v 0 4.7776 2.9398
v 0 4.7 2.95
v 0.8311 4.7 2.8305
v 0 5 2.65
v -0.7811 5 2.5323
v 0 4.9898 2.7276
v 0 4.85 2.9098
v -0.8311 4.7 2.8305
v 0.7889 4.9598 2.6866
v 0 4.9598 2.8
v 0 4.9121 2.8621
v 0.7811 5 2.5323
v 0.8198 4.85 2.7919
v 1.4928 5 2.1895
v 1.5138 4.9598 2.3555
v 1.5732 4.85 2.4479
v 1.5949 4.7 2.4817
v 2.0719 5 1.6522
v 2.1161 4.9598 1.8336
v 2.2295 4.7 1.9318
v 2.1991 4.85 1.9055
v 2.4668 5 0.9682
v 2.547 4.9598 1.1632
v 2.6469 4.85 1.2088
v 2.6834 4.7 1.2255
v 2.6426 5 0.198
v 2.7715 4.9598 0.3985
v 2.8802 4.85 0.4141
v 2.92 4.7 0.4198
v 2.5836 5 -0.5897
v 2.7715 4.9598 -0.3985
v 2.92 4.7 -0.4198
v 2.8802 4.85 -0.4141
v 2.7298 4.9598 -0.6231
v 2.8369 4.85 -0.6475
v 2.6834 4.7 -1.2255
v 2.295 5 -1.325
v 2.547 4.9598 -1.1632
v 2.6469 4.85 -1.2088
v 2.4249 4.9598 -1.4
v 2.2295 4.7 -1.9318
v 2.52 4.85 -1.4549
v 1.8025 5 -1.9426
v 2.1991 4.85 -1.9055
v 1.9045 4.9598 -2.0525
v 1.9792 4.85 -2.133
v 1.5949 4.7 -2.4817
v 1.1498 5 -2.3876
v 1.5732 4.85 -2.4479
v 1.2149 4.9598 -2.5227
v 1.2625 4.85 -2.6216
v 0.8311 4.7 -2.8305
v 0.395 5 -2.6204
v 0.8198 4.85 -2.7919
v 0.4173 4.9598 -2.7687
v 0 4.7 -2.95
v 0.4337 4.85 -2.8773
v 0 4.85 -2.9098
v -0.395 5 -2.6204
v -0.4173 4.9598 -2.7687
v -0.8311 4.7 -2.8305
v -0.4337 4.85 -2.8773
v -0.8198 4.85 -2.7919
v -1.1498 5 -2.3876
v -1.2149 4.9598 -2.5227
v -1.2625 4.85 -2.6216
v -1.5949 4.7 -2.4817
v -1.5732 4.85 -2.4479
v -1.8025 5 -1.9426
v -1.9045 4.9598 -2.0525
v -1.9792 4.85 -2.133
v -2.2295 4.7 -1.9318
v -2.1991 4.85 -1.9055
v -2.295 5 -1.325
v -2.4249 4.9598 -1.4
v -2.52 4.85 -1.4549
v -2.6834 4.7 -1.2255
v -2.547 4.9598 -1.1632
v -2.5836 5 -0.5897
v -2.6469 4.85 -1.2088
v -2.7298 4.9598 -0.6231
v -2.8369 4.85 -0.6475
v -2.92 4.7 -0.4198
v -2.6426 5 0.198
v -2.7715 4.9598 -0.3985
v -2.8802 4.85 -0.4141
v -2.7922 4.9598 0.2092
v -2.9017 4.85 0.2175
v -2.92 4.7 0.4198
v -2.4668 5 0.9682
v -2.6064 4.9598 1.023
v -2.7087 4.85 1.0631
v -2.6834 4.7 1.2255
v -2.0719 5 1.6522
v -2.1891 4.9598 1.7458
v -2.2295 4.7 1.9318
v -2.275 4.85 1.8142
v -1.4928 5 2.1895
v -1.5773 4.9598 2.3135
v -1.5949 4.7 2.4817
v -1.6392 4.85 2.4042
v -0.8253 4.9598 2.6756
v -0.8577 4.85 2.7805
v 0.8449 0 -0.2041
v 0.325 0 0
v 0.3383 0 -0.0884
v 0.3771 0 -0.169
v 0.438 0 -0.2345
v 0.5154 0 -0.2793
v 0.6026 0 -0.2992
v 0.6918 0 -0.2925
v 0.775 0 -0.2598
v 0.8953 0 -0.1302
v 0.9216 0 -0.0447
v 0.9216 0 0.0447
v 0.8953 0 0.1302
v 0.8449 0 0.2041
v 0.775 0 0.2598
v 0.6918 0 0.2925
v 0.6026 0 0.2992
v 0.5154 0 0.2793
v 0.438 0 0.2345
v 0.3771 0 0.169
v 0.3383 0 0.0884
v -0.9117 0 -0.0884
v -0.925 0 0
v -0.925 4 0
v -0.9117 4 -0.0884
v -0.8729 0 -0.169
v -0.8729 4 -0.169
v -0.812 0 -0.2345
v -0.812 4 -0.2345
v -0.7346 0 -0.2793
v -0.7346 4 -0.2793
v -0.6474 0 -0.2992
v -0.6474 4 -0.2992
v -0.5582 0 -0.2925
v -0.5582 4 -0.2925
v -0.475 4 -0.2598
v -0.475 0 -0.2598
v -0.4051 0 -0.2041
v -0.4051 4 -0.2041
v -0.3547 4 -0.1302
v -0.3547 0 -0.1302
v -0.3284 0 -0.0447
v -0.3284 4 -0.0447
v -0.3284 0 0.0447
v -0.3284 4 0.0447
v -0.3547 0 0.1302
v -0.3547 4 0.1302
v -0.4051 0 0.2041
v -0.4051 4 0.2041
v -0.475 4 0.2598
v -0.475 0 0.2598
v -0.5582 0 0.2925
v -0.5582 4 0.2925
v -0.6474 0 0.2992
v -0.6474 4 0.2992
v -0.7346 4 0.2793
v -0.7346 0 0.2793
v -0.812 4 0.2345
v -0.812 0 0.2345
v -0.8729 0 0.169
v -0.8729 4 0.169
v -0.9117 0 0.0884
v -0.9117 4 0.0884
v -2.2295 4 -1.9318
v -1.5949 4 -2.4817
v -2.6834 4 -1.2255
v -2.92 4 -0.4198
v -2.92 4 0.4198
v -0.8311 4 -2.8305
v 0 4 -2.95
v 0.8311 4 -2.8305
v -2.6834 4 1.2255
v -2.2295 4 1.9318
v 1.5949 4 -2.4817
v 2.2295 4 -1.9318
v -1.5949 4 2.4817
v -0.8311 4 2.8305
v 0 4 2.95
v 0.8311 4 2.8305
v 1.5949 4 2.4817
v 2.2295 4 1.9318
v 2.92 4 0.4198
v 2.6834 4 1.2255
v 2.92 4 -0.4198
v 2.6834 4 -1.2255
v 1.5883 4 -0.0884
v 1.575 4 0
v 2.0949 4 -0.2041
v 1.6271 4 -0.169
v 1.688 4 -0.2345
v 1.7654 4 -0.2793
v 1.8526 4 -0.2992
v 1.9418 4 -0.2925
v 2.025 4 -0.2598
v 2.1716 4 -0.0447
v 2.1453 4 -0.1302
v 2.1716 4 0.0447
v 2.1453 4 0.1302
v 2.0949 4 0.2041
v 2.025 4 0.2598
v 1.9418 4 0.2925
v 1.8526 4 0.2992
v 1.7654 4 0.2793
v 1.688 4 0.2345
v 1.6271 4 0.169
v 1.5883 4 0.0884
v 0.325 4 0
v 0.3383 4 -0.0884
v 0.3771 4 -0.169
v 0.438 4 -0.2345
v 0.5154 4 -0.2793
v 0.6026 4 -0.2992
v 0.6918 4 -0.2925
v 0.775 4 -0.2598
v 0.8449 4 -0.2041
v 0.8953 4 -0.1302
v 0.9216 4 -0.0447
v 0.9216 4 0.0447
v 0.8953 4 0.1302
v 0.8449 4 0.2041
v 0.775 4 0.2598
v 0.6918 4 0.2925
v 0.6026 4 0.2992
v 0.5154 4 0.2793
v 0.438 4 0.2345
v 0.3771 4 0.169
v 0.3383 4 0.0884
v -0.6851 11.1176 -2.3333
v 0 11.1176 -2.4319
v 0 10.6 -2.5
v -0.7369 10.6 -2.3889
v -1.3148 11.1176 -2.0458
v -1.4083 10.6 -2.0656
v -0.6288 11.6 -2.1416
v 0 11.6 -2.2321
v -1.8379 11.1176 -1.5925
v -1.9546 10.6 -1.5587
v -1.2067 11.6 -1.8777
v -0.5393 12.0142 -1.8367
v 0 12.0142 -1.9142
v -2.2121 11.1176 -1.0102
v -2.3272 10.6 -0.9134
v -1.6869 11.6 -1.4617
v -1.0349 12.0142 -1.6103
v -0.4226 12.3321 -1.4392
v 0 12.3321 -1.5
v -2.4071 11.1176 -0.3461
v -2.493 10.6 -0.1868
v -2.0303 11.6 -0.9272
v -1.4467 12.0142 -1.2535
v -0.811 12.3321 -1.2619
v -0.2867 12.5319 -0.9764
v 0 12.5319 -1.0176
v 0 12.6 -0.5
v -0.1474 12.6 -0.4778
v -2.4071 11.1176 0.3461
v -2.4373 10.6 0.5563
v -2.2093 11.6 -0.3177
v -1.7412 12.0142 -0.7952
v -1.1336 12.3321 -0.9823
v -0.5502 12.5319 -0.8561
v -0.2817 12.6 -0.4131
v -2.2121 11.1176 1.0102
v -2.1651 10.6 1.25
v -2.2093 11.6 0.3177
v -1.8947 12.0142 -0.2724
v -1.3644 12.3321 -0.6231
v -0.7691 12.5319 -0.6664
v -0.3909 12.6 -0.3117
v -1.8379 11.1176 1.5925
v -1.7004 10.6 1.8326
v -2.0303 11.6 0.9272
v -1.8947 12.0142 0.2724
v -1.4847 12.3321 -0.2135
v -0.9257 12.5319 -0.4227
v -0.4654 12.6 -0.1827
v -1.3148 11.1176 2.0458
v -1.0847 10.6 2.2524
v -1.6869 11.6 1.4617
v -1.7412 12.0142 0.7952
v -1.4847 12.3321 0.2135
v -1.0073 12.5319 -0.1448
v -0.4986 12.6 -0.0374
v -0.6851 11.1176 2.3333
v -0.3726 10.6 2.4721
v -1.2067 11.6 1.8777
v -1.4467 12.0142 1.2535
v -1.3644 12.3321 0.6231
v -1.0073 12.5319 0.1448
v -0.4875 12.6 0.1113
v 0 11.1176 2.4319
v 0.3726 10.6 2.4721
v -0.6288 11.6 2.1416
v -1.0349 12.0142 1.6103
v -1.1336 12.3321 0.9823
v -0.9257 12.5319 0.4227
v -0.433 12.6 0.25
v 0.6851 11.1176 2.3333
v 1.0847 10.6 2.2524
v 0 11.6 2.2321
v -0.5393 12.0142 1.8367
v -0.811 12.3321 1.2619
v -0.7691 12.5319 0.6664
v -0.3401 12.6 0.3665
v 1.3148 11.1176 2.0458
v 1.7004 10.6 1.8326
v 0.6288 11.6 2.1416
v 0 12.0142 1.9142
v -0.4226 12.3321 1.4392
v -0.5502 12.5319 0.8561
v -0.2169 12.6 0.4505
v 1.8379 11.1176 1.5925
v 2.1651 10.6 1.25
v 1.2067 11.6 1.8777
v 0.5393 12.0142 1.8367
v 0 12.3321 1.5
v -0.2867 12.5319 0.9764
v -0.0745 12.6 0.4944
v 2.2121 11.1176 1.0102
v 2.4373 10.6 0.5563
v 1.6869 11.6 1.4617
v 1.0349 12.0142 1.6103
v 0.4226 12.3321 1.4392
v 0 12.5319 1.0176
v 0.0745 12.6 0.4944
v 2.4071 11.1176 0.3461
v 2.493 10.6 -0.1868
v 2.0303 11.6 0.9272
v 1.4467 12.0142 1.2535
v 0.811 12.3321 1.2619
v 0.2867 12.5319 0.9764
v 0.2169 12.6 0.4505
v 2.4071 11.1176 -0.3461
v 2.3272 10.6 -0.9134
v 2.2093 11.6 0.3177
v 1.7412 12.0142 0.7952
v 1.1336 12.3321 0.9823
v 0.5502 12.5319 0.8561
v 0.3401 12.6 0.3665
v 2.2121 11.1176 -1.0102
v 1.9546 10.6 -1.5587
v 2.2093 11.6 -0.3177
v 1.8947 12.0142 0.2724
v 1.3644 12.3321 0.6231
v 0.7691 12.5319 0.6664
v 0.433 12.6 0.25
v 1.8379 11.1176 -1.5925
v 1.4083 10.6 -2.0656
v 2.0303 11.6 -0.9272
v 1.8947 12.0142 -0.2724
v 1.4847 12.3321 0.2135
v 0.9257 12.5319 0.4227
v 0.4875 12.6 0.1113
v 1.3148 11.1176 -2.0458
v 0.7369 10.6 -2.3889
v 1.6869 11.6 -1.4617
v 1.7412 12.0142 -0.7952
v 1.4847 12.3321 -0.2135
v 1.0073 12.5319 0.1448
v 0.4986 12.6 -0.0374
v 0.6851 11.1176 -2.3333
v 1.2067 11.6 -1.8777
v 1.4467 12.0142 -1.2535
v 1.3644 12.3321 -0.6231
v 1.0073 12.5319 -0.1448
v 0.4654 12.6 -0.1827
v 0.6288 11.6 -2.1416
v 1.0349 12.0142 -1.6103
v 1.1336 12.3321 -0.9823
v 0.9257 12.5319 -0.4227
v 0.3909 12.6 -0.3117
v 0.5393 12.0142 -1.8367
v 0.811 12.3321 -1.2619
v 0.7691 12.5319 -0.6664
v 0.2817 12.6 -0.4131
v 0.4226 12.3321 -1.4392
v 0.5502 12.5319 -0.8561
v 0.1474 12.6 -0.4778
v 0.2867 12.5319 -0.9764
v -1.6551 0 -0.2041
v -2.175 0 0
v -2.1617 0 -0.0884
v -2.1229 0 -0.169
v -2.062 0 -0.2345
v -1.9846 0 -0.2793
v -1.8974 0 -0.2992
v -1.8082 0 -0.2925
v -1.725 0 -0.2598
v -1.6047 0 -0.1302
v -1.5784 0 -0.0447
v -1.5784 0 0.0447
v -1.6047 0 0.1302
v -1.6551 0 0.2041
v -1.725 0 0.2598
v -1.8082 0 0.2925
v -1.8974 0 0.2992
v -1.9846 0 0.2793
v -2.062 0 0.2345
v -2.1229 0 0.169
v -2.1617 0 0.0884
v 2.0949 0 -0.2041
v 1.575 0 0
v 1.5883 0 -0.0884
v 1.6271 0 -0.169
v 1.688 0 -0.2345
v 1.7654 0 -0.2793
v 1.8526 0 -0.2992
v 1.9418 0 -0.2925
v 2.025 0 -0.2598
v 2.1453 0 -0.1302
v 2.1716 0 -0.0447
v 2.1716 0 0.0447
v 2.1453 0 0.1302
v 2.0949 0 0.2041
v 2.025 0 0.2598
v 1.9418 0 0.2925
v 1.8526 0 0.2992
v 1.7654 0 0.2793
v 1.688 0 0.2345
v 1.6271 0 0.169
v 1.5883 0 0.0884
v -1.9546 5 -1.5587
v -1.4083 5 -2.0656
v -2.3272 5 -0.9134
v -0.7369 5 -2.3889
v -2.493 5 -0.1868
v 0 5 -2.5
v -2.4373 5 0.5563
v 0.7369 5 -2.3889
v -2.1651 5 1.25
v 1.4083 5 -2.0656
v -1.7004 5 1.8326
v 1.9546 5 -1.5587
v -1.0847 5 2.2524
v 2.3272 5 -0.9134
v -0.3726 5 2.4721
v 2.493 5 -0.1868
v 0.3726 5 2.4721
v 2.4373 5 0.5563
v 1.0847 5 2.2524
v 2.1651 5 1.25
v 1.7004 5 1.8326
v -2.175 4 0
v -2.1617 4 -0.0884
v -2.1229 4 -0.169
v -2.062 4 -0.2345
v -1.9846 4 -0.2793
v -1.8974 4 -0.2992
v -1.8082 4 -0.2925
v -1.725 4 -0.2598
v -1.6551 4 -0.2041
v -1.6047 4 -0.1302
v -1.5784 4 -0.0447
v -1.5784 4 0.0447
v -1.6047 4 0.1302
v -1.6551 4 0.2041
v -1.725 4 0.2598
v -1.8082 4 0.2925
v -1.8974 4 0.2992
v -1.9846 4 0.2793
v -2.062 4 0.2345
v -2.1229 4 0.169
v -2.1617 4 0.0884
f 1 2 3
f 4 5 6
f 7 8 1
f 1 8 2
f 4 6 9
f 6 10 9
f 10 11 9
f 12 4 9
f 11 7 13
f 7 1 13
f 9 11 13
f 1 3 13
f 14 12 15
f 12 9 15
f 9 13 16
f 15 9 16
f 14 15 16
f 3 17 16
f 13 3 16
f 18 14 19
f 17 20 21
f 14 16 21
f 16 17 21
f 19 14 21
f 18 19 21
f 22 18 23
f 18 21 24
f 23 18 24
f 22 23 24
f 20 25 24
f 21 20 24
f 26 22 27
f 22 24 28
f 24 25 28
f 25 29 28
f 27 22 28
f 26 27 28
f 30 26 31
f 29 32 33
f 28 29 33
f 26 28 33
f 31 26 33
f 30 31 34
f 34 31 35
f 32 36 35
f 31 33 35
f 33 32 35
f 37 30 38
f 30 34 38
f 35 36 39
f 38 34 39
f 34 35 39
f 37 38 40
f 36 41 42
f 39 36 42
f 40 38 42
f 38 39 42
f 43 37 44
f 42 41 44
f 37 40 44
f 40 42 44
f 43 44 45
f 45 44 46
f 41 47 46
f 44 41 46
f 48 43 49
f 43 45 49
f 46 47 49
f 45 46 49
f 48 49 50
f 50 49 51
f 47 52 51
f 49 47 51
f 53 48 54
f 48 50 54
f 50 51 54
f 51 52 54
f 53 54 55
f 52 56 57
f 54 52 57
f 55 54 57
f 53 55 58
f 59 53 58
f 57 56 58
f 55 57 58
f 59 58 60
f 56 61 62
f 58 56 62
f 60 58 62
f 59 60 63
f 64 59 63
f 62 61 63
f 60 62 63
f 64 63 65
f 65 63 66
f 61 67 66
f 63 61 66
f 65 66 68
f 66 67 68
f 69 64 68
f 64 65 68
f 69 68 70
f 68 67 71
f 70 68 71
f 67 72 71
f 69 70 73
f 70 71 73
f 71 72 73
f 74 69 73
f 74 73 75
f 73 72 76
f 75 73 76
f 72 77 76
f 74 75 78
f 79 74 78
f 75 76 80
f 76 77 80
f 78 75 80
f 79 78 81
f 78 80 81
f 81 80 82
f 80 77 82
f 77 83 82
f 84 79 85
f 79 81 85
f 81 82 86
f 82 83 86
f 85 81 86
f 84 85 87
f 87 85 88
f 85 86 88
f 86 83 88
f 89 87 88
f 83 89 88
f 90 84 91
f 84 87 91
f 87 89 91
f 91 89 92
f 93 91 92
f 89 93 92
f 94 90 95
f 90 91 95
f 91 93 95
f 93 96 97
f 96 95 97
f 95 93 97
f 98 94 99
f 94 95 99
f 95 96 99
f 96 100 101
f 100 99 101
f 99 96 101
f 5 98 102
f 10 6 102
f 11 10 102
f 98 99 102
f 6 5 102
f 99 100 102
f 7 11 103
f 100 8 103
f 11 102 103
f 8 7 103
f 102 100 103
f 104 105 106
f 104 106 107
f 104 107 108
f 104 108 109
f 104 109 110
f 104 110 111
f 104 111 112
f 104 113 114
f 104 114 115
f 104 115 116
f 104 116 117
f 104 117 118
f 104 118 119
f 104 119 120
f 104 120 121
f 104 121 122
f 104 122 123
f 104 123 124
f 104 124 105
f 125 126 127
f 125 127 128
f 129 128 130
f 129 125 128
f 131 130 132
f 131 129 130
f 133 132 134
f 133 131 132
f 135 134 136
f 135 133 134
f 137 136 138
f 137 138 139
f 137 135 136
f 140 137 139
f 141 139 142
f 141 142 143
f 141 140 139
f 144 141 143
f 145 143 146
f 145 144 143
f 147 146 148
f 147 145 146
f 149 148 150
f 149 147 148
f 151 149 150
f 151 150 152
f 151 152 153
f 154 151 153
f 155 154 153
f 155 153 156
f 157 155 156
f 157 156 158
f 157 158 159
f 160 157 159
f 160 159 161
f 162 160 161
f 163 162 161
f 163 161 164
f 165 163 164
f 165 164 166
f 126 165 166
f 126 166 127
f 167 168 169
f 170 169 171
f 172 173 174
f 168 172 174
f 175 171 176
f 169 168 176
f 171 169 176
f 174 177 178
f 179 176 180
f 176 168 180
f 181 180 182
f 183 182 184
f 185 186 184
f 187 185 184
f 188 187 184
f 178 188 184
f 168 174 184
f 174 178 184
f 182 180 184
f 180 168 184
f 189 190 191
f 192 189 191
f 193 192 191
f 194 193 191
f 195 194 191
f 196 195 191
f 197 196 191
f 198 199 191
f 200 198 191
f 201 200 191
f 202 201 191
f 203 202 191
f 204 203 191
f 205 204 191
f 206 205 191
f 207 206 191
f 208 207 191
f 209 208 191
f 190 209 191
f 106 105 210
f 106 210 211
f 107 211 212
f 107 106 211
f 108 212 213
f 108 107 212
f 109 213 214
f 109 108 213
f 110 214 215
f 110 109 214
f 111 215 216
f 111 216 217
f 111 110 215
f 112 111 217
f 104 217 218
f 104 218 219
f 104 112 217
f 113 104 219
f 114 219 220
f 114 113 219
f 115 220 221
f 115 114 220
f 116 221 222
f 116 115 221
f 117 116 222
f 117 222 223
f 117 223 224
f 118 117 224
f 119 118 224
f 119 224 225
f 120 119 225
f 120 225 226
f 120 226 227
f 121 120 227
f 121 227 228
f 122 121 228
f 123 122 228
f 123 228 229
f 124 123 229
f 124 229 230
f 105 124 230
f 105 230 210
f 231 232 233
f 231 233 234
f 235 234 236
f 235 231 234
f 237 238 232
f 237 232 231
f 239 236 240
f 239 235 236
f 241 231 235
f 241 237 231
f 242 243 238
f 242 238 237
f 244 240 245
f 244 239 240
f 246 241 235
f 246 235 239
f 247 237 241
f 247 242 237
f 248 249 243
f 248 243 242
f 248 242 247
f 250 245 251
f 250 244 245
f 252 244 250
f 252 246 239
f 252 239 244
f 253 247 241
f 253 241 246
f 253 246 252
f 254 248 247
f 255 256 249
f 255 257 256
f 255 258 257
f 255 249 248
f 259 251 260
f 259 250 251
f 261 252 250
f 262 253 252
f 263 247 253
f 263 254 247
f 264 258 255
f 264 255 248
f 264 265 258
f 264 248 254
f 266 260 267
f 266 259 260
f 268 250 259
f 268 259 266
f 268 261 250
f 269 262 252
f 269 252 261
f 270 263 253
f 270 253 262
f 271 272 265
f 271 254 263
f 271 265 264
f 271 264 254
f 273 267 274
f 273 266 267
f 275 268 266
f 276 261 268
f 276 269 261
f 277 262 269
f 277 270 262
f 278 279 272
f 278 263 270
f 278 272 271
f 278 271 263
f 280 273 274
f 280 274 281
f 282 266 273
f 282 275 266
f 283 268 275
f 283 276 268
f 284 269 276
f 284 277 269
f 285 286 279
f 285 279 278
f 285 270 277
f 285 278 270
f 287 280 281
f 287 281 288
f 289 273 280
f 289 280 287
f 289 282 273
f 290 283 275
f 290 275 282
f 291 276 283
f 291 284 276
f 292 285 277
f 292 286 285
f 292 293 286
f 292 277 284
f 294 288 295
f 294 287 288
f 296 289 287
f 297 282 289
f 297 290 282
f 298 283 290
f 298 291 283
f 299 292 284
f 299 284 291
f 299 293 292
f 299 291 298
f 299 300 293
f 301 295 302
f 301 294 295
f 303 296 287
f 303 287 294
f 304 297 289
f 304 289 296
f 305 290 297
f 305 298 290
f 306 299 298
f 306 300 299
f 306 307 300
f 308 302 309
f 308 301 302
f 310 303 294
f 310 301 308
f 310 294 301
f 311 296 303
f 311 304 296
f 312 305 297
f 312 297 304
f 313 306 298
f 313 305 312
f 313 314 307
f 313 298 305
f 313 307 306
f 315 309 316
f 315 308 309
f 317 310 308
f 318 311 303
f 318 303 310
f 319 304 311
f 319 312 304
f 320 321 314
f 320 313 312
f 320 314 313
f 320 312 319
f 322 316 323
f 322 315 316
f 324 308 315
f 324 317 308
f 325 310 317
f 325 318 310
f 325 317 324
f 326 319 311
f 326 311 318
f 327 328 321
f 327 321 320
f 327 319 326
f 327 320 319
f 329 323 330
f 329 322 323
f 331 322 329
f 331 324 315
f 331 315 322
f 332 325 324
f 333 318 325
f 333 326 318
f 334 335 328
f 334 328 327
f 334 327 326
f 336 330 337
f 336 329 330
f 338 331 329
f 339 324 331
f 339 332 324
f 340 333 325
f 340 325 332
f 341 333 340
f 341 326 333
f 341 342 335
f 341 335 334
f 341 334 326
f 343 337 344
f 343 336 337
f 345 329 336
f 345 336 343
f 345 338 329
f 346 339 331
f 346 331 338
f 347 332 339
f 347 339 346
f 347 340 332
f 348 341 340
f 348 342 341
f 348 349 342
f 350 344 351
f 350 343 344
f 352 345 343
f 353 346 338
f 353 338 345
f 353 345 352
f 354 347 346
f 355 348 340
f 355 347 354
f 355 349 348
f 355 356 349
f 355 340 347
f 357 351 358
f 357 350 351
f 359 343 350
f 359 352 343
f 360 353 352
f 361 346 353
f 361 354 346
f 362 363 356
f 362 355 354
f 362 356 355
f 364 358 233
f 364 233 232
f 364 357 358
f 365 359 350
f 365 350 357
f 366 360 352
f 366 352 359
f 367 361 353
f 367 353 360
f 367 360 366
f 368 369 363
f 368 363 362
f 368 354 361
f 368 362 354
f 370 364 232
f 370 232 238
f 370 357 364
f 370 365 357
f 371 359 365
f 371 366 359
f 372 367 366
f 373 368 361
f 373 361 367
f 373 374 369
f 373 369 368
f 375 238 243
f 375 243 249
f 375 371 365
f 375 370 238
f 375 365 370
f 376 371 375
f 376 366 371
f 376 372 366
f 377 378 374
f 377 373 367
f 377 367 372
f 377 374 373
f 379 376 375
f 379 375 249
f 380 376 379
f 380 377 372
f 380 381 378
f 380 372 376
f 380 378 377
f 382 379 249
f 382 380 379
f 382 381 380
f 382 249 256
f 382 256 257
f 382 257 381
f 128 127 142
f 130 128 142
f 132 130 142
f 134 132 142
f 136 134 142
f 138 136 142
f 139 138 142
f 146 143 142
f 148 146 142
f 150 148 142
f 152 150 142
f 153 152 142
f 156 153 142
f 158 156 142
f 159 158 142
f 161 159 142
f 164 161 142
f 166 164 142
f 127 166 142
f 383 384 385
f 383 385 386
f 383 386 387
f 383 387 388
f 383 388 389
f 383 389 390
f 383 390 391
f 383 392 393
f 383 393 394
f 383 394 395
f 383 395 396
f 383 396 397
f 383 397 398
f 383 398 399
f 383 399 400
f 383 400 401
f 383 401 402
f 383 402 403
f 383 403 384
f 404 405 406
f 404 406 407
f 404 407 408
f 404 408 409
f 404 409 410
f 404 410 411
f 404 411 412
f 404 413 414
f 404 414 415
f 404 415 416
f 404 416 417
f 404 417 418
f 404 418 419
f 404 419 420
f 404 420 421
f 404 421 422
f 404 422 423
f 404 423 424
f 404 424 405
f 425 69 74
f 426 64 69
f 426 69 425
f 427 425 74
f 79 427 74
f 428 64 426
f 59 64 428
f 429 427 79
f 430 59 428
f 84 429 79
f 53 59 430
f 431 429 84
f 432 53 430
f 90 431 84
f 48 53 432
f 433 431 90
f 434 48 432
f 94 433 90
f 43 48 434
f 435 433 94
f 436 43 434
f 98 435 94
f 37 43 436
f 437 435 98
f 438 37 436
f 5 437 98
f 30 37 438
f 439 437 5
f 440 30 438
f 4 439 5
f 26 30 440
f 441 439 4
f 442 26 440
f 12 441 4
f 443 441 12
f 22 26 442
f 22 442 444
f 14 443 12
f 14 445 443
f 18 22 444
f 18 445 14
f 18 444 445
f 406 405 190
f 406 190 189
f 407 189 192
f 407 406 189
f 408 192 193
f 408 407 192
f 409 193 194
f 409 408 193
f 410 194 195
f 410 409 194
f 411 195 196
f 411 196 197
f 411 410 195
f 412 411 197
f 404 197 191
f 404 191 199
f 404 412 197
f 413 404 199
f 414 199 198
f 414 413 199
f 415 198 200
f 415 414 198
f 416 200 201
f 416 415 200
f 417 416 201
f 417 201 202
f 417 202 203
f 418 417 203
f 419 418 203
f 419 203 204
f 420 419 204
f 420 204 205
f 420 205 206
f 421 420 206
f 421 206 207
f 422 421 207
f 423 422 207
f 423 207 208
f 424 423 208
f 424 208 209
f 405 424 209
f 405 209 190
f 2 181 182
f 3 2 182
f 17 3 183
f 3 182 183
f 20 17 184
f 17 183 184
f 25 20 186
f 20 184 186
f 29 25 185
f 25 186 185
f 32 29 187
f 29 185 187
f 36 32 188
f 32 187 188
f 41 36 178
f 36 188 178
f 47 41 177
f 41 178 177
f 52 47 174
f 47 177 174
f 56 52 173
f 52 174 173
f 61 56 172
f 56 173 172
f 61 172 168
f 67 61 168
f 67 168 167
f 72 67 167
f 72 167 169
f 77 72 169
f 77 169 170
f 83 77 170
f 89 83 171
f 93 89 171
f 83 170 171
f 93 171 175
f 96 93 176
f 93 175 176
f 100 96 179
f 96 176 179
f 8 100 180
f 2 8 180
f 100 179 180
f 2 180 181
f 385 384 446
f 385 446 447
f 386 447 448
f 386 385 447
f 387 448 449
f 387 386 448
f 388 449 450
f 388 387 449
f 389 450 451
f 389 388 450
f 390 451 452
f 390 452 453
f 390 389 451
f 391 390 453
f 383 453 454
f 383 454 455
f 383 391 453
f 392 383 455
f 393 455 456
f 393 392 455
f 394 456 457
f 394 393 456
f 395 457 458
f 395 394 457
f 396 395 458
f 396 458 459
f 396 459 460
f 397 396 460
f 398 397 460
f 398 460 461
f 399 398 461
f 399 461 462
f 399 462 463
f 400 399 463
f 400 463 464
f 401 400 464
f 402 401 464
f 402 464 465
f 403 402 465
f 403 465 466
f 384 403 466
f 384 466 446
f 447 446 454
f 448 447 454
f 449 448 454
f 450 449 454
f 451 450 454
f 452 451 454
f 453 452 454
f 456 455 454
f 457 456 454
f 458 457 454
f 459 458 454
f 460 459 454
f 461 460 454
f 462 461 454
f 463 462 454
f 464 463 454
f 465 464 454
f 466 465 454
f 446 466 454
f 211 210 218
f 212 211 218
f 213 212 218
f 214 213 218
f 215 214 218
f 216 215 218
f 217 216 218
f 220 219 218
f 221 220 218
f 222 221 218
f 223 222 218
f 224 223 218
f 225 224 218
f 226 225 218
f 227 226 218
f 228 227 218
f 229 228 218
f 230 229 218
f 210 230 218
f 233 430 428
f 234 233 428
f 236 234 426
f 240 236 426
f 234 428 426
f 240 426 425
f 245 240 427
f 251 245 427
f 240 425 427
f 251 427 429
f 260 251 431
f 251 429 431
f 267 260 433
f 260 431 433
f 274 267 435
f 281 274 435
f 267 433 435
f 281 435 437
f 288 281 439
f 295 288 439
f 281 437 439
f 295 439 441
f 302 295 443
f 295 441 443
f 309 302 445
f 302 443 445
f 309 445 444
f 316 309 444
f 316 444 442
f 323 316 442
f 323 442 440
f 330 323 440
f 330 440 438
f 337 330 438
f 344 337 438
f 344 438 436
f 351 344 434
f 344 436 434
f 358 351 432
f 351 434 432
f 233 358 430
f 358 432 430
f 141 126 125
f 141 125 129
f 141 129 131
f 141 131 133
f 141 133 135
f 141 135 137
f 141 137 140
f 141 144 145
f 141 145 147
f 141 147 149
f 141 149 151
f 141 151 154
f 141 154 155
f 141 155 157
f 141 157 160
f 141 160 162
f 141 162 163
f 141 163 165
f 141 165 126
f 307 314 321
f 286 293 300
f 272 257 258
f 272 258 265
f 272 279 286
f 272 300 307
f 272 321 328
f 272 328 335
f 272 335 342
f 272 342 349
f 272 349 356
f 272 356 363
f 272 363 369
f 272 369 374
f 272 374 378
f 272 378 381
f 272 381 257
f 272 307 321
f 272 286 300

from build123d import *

# Parameters (mm, degrees)
EXTRUDE_START          = 4
SKETCH_1_R             = 2.95
EXTRUDE_1_DEPTH        = 1
SKETCH_3_R             = 2.5
EXTRUDE_2_DEPTH        = 7.6
FILLET_1_R             = 2
FILLET_2_R             = 0.3
SWEEP_1_PROFILE_R      = 0.3
PATTERN_LINEAR_1_COUNT = 4
PATTERN_LINEAR_1_PITCH = 1.25


with BuildPart() as part:
    # Эскиз1 → Бобышка-Вытянуть1 (new body)
    with BuildSketch(Plane(origin=(0, 0, 0), x_dir=(1, 0, 0), z_dir=(0, 1, 0)).offset(EXTRUDE_START)):
        with Locations(Location((0, 0, 0), (0, 0, 270))):
            Circle(SKETCH_1_R)
    extrude(amount=EXTRUDE_1_DEPTH)

    # Эскиз3 → Бобышка-Вытянуть2 (add)
    with BuildSketch(Plane(origin=(0, 5, 0), x_dir=(1, 0, 0), z_dir=(0, 1, 0))):
        with Locations(Location((0, 0, 0), (0, 0, 90))):
            Circle(SKETCH_3_R)
    extrude(amount=EXTRUDE_2_DEPTH)

    # Скругление1
    fillet_1_edges = [part.edges().sort_by_distance(p)[0] for p in [
        (0, 12.6, 2.5),
    ]]
    fillet(fillet_1_edges, radius=FILLET_1_R)

    # Скругление2
    fillet_2_edges = [part.edges().sort_by_distance(p)[0] for p in [
        (0, 5, -2.95),
    ]]
    fillet(fillet_2_edges, radius=FILLET_2_R)


with BuildPart() as body_2:
    # По траектории1: sweep along a path in Эскиз6
    with BuildLine(Plane.XY) as sweep_1_path:
        Line((-1.875, 4), (-1.875, 0))
    # По траектории1 profile (on start of the path) → По траектории1 (sweep)
    with BuildSketch(Plane(origin=(-1.875, 4, 0), x_dir=(-1, 0, 0), z_dir=(0, -1, 0))):
        Circle(SWEEP_1_PROFILE_R)
    sweep_1 = sweep(path=sweep_1_path.line)


with BuildPart() as pattern_linear_1_1:
    # Линейный массив1: По траектории1 ×4
    with Locations(*[(i * PATTERN_LINEAR_1_PITCH, 0, 0) for i in range(1, PATTERN_LINEAR_1_COUNT)]):
        add(sweep_1)


solid = Compound([part.part, body_2.part, pattern_linear_1_1.part])
